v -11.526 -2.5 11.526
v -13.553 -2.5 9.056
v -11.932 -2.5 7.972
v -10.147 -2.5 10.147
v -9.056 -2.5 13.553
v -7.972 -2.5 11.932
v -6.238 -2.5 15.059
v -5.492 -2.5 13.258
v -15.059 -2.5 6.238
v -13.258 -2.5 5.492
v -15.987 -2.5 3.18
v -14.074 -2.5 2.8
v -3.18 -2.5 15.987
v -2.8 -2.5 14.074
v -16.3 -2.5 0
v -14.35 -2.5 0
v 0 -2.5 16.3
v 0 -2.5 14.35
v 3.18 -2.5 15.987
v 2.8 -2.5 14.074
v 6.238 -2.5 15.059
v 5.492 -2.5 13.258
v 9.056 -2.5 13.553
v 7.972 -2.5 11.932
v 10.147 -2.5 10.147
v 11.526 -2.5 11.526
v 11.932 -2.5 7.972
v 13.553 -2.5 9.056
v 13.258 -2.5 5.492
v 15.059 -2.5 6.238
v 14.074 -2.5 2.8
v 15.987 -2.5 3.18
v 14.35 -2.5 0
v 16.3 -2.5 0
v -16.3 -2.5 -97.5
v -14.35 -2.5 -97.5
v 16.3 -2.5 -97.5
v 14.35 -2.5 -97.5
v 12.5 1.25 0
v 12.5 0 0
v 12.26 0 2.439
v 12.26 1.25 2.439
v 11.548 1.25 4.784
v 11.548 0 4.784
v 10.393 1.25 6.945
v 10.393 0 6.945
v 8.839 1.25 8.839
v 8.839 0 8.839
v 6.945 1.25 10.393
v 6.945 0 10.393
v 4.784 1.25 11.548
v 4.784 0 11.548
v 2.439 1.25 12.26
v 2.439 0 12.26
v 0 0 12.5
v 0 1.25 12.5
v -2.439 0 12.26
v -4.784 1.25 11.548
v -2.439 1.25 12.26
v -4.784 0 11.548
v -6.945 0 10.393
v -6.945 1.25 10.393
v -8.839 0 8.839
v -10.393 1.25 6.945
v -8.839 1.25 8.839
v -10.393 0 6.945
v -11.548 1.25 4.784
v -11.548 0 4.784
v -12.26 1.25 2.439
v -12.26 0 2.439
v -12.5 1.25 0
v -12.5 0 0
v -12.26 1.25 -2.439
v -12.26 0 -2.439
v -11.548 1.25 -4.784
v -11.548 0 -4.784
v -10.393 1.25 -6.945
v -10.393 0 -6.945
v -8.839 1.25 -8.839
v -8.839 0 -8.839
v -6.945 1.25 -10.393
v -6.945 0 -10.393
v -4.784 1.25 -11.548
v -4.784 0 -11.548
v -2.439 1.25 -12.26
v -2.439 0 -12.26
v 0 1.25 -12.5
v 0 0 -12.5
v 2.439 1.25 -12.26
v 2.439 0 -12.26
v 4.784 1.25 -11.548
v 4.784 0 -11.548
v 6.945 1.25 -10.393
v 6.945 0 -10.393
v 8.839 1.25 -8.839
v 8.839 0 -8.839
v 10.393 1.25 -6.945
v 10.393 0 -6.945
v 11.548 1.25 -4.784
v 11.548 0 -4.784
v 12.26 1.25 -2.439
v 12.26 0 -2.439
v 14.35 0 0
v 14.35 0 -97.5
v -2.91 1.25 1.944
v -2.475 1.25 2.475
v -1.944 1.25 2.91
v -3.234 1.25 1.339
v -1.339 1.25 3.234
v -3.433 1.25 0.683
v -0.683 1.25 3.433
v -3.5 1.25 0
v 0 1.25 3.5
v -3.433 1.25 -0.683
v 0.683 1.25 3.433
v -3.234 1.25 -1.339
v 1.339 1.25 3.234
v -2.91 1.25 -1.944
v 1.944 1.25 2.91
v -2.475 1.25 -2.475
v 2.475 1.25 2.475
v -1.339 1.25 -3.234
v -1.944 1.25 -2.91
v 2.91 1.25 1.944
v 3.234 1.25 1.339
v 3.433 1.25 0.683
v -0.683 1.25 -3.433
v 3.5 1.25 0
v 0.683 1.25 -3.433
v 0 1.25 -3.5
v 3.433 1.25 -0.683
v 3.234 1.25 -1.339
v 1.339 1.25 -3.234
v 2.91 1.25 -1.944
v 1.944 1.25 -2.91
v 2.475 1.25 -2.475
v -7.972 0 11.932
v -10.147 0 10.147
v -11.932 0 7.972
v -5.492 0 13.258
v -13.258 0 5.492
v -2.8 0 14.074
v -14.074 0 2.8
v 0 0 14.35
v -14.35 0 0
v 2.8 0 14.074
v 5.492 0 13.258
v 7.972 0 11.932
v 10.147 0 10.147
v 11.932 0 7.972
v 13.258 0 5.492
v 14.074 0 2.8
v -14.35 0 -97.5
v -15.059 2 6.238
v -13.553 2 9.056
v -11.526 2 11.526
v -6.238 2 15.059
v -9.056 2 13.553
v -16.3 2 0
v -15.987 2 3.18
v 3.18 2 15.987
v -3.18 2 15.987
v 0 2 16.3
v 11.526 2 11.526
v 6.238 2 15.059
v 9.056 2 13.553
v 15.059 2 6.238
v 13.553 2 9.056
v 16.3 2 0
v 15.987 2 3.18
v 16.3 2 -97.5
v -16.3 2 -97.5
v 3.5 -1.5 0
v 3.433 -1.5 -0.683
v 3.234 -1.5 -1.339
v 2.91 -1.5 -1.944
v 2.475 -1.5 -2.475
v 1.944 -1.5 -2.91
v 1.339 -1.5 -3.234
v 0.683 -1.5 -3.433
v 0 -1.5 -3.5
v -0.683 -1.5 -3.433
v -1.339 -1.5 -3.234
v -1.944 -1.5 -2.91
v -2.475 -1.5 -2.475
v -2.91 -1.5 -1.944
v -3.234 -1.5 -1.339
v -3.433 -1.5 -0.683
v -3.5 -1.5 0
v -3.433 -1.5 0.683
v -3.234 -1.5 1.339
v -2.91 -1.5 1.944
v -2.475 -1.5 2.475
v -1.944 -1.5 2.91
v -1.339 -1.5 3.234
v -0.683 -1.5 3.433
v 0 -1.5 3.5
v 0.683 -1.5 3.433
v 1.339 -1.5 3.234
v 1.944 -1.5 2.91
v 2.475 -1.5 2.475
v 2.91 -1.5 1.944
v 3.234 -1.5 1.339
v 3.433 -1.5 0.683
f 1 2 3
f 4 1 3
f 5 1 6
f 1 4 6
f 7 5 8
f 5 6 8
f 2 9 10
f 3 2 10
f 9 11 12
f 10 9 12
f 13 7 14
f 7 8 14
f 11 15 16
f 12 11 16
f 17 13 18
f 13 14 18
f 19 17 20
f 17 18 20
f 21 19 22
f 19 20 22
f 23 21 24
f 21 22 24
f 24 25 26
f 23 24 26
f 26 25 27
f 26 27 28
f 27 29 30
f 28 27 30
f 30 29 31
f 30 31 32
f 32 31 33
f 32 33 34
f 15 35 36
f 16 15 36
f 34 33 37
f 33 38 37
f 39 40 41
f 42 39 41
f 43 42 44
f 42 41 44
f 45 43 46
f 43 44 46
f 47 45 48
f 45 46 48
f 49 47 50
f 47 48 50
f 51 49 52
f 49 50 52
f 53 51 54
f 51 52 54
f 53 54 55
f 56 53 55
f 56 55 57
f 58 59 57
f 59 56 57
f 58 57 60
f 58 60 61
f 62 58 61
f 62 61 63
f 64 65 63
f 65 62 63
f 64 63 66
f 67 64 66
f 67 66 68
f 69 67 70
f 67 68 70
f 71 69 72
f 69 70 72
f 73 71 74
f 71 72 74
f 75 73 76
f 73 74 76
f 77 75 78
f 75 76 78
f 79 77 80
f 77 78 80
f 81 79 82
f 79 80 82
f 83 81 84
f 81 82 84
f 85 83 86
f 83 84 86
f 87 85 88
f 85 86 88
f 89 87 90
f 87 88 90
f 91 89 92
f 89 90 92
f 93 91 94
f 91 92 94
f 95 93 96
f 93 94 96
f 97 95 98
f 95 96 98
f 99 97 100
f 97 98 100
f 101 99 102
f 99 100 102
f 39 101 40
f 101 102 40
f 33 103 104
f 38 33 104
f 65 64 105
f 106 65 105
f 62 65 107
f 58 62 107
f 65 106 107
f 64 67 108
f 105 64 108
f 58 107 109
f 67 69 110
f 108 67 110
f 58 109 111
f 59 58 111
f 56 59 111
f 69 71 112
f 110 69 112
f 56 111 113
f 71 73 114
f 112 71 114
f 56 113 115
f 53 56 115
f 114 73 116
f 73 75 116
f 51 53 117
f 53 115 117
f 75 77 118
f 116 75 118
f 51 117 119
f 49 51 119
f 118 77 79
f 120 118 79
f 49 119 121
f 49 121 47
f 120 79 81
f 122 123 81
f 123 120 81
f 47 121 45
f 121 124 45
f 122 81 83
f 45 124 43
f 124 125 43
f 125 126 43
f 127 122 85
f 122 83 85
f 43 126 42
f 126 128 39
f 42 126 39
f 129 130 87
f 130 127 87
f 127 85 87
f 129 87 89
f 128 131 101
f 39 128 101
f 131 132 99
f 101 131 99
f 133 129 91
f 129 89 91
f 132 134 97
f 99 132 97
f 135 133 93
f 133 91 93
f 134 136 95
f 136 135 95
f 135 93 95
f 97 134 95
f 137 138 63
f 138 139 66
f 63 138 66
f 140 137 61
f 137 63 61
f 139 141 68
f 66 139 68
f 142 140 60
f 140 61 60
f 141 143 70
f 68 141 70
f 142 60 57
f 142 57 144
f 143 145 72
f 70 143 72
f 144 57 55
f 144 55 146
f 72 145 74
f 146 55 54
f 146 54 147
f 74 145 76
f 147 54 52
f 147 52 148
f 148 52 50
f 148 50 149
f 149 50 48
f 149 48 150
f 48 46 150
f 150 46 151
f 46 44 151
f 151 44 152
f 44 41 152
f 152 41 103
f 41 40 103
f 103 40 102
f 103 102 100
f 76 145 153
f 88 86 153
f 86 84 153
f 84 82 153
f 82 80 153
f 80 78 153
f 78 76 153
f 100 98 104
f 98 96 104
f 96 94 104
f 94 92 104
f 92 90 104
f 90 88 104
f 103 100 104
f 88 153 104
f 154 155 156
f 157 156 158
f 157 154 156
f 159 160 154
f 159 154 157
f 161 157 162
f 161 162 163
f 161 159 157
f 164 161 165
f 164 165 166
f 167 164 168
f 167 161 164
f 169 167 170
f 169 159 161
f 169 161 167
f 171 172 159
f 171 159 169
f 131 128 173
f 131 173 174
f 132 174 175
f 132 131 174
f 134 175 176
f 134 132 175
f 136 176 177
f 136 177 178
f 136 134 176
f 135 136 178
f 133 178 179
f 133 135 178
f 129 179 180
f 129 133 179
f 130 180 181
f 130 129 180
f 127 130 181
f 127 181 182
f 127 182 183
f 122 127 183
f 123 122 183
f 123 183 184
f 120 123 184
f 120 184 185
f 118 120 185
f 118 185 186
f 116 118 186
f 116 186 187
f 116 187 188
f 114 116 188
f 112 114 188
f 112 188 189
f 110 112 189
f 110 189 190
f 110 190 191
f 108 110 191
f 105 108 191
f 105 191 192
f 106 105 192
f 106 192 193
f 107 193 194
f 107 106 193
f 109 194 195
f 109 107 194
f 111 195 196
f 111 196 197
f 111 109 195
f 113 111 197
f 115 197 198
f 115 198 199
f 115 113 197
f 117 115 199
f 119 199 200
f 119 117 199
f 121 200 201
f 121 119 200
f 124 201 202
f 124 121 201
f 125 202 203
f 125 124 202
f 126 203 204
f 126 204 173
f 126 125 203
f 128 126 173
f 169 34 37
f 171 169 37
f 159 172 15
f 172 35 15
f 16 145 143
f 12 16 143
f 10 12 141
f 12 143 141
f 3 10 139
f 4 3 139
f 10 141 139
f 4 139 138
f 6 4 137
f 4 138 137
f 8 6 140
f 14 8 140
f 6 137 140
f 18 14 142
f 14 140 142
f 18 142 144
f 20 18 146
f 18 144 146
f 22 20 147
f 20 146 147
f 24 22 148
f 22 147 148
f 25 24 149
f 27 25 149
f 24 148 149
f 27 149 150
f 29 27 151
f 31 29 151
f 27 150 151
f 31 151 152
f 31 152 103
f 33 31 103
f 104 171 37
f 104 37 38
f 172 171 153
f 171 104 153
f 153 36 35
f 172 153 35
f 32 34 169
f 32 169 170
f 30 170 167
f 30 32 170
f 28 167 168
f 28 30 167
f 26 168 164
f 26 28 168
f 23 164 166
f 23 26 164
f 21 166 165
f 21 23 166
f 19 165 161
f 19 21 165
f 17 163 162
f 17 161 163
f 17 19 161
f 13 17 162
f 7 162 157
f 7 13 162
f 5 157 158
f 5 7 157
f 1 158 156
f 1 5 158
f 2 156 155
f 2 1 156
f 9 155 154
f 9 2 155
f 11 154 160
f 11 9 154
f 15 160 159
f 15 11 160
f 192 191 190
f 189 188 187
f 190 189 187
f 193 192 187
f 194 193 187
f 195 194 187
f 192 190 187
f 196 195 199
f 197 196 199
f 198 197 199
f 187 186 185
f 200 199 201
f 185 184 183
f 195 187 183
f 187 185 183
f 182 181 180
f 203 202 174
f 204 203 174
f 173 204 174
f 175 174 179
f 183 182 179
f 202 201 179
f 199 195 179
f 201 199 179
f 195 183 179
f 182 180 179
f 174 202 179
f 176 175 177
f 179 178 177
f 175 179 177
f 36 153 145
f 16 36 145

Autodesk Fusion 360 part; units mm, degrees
sketch "Sketch1" plane through (0, 0, 0) normal (0, 1, 0) x (1, 0, 0)
  line L0 (-16.3, 0) -> (16.3, 0)
  line L1 (16.3, 0) -> (16.3, 97.5)
  line L2 (16.3, 97.5) -> (-16.3, 97.5)
  line L3 (-16.3, 97.5) -> (-16.3, 0)
  line L4 (0, 102.6744) -> (0, -20) construction
  arc A0 (-16.3, 0) -> (16.3, 0) centre (0, 0) ccw
  line L5 (-14.35, 97.5) -> (-14.35, 0)
  arc A1 (-14.35, 0) -> (14.35, 0) centre (0, 0) ccw
  line L6 (14.35, 0) -> (14.35, 97.5)
  dimension "d1" = 32.6
  dimension "d2" = 97.5
  dimension "d3" = 1.95
extrude "Extrude1" add sketch "Sketch1" along normal blind 2
extrude "Extrude2" add sketch "Sketch1" against normal blind 2.5 contours L0 L2 L3 L5 | L0 A0 A1 | L0 L1 L2 L6
sketch "Sketch2" plane through (0, 0, 7.15) normal (0, 1, 0) x (1, 0, 0)
  circle A0 centre (0, 7.15) radius 3.5
  circle A1 centre (0, 7.15) radius 4.1
  circle A2 centre (0, 7.15) radius 4.7
  circle A3 centre (0, 7.15) radius 5.3
  circle A4 centre (0, 7.15) radius 5.9
  circle A5 centre (0, 7.15) radius 6.5
  circle A6 centre (0, 7.15) radius 7.1
  circle A7 centre (0, 7.15) radius 7.7
  circle A8 centre (0, 7.15) radius 8.3
  line L0 (27.1083, -9.4638) -> (28.3083, -9.4638)
  line L1 (28.3083, -9.4638) -> (28.3083, -7.488)
  line L2 (28.3083, -7.488) -> (27.1083, -7.488)
  line L3 (27.1083, -7.488) -> (27.1083, -9.4638)
  circle A9 centre (0, 7.15) radius 8.9
  circle A10 centre (0, 7.15) radius 9.5
  circle A11 centre (0, 7.15) radius 10.1
  circle A12 centre (0, 7.15) radius 10.7
  circle A13 centre (0, 7.15) radius 11.3
  circle A14 centre (0, 7.15) radius 11.9
  circle A15 centre (0, 7.15) radius 12.5
  dimension "d18" = 7
  dimension "d19" = 8.2
  dimension "d20" = 1.2
  dimension "d21" = 9.4
  dimension "d22" = 10.6
  dimension "d23" = 11.8
  dimension "d24" = 13
  dimension "d25" = 14.2
  dimension "d26" = 15.4
  dimension "d27" = 16.6
  dimension "d28" = 17.8
  dimension "d29" = 19
  dimension "d30" = 20.2
  dimension "d31" = 21.4
  dimension "d32" = 22.6
  dimension "d33" = 23.8
  dimension "d34" = 25
extrude "Extrude4" cut sketch "Sketch2" along normal blind 1.25 contours A1 | A2 | A3 | A4 | A5 | A6 | A7 | A8 | A9 | A10 | A11 | A12 | A13 | A14 | A15
extrude "Extrude5" add 1 faces at (0.555, 0, 0.9381) along direction (0, -1, 0) blind 1.5
equation "d1 = 33 mm - 0.4 mm"
equation "d2 = 114 mm - ( 33 / 2 ) * 1 mm"
equation "d19 = d18 + d20"
equation "d21 = d19 + d20"
equation "d22 = d21 + d20"
equation "d23 = d22 + d20"
equation "d24 = d23 + d20"
equation "d25 = d24 + d20"
equation "d26 = d25 + d20"
equation "d27 = d26 + d20"
equation "d28 = d27 + d20"
equation "d29 = d28 + d20"
equation "d30 = d29 + d20"
equation "d31 = d30 + d20"
equation "d32 = d31 + d20"
equation "d33 = d32 + d20"
equation "d34 = d33 + d20"
